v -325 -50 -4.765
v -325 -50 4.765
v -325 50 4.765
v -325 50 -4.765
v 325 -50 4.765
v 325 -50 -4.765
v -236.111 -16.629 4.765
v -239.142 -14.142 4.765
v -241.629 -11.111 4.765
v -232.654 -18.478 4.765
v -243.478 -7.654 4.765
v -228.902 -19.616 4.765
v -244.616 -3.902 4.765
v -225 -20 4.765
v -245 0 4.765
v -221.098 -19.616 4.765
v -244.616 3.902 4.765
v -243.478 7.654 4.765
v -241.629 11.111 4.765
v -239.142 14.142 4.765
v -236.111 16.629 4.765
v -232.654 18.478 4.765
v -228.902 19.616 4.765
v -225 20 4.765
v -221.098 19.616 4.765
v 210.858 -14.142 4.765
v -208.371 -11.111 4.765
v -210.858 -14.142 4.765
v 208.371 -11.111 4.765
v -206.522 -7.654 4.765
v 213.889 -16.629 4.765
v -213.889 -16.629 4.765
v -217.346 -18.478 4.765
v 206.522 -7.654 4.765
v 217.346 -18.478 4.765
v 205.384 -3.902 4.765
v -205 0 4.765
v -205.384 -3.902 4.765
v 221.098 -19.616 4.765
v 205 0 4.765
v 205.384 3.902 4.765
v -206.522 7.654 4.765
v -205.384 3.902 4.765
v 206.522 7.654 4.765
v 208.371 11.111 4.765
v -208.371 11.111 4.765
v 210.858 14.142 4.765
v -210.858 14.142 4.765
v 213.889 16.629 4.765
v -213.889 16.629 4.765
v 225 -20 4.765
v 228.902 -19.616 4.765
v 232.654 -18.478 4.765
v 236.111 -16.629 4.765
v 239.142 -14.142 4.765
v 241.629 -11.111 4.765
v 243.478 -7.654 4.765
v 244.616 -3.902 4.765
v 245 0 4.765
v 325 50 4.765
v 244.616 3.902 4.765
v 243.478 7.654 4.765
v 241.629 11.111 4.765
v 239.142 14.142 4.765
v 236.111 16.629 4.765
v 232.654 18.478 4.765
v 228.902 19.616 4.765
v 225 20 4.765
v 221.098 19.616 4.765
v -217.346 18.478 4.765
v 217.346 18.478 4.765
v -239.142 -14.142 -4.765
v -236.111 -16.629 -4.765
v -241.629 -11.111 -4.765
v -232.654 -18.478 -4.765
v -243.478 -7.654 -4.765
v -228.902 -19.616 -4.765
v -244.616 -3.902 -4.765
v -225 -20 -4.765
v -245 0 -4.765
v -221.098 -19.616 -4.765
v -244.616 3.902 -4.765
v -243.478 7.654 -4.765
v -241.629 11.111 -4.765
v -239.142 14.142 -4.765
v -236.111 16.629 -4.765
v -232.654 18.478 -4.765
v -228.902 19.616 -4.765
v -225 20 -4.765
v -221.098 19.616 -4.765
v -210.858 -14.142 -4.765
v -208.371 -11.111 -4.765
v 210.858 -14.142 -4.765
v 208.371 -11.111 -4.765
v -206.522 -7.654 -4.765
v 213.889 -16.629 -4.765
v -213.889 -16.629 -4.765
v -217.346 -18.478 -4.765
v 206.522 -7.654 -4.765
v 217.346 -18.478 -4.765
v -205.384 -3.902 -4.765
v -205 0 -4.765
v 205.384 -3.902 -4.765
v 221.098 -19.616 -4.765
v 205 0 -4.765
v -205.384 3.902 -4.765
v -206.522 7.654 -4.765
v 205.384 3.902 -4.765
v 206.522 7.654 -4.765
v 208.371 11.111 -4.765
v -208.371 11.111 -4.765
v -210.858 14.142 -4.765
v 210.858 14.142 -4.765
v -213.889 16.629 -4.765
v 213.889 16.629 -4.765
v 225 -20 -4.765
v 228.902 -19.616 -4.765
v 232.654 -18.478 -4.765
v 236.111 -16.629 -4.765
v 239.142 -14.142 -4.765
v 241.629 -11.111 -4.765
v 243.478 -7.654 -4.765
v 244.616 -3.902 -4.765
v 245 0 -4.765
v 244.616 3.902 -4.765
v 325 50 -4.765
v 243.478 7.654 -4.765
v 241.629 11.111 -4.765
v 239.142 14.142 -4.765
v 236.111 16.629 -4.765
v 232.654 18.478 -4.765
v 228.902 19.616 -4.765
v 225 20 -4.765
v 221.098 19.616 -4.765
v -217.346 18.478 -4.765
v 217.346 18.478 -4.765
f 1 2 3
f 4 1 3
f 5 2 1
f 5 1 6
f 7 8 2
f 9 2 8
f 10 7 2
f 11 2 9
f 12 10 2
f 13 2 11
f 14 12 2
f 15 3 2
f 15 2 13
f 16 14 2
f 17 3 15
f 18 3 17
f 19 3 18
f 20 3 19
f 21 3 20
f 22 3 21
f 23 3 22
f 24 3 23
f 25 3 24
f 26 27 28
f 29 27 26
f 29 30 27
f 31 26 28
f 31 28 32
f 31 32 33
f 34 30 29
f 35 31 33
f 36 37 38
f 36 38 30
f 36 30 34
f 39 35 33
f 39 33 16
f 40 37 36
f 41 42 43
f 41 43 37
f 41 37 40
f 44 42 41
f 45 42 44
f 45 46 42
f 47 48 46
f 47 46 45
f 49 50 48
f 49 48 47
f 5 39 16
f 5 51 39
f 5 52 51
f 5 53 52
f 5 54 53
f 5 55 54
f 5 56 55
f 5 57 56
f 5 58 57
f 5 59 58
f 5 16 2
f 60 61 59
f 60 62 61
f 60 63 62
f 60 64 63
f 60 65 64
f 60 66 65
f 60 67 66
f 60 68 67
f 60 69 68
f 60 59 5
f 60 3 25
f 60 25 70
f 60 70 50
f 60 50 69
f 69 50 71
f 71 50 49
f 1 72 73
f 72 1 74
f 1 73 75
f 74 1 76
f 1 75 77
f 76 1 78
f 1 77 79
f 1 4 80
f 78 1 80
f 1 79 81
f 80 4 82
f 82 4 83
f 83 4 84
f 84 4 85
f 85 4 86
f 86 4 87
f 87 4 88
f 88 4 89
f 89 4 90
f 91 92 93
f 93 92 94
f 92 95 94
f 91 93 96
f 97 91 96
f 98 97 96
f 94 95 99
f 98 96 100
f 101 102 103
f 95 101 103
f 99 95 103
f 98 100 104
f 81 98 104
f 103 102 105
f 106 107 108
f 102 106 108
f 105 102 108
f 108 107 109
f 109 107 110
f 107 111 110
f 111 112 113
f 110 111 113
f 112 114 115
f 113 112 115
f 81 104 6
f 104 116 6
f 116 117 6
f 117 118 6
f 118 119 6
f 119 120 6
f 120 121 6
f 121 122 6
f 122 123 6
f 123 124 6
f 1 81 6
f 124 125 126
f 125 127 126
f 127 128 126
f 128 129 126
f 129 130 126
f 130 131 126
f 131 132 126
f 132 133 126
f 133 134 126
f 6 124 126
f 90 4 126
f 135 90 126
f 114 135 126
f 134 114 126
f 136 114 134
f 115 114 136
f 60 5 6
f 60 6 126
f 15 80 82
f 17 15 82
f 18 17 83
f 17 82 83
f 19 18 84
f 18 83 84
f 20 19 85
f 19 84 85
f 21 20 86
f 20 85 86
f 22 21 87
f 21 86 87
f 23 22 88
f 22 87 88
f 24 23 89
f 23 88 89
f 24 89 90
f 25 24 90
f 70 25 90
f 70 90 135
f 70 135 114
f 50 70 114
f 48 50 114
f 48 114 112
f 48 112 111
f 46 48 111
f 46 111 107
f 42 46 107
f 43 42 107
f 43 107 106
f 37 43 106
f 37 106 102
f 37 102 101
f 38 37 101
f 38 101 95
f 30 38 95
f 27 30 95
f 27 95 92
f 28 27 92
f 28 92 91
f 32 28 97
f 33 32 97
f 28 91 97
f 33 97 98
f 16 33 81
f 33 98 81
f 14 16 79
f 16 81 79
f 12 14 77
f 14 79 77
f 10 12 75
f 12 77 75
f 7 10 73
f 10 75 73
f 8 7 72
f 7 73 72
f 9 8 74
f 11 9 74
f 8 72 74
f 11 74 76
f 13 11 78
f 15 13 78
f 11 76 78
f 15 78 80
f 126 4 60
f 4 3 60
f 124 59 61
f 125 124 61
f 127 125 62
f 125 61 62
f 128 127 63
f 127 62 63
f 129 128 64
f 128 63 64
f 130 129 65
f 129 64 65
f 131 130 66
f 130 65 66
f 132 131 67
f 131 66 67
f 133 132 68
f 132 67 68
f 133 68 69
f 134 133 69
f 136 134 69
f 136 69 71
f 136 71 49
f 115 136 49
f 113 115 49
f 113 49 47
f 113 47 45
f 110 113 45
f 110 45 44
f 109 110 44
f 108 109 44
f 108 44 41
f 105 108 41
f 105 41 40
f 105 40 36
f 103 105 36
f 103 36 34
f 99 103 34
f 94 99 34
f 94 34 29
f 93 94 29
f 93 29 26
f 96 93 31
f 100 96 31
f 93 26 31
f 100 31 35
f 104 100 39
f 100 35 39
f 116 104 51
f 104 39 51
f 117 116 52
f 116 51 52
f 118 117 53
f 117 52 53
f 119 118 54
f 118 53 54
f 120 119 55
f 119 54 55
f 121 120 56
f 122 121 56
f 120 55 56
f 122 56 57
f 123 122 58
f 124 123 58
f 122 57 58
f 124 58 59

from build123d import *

# Parameters (mm, degrees)
CROQUIS1_W              = 650
CROQUIS1_H              = 100
SALIENTE_EXTRUIR1_DEPTH = 4.765
CROQUIS4_R              = 20
CORTAR_EXTRUIR3_DEPTH   = 15
CROQUIS3_R              = 20
CORTAR_EXTRUIR4_DEPTH   = 15


with BuildPart() as part:
    # Croquis1 → Saliente-Extruir1 (new, symmetric)
    with BuildSketch(Plane.XY):
        Rectangle(CROQUIS1_W, CROQUIS1_H)
    extrude(amount=SALIENTE_EXTRUIR1_DEPTH, both=True)

    # Croquis4 → Cortar-Extruir3 (cut)
    with BuildSketch(Plane(origin=(0, 0, -4.765), x_dir=(-1, 0, 0), z_dir=(0, 0, -1))):
        with Locations((225, 0)):
            Circle(CROQUIS4_R)
    extrude(amount=-CORTAR_EXTRUIR3_DEPTH, mode=Mode.SUBTRACT)

    # Croquis3 → Cortar-Extruir4 (cut)
    with BuildSketch(Plane.XY.offset(4.765)):
        with Locations((225, 0)):
            Circle(CROQUIS3_R)
    extrude(amount=-CORTAR_EXTRUIR4_DEPTH, mode=Mode.SUBTRACT)


solid = part.part
